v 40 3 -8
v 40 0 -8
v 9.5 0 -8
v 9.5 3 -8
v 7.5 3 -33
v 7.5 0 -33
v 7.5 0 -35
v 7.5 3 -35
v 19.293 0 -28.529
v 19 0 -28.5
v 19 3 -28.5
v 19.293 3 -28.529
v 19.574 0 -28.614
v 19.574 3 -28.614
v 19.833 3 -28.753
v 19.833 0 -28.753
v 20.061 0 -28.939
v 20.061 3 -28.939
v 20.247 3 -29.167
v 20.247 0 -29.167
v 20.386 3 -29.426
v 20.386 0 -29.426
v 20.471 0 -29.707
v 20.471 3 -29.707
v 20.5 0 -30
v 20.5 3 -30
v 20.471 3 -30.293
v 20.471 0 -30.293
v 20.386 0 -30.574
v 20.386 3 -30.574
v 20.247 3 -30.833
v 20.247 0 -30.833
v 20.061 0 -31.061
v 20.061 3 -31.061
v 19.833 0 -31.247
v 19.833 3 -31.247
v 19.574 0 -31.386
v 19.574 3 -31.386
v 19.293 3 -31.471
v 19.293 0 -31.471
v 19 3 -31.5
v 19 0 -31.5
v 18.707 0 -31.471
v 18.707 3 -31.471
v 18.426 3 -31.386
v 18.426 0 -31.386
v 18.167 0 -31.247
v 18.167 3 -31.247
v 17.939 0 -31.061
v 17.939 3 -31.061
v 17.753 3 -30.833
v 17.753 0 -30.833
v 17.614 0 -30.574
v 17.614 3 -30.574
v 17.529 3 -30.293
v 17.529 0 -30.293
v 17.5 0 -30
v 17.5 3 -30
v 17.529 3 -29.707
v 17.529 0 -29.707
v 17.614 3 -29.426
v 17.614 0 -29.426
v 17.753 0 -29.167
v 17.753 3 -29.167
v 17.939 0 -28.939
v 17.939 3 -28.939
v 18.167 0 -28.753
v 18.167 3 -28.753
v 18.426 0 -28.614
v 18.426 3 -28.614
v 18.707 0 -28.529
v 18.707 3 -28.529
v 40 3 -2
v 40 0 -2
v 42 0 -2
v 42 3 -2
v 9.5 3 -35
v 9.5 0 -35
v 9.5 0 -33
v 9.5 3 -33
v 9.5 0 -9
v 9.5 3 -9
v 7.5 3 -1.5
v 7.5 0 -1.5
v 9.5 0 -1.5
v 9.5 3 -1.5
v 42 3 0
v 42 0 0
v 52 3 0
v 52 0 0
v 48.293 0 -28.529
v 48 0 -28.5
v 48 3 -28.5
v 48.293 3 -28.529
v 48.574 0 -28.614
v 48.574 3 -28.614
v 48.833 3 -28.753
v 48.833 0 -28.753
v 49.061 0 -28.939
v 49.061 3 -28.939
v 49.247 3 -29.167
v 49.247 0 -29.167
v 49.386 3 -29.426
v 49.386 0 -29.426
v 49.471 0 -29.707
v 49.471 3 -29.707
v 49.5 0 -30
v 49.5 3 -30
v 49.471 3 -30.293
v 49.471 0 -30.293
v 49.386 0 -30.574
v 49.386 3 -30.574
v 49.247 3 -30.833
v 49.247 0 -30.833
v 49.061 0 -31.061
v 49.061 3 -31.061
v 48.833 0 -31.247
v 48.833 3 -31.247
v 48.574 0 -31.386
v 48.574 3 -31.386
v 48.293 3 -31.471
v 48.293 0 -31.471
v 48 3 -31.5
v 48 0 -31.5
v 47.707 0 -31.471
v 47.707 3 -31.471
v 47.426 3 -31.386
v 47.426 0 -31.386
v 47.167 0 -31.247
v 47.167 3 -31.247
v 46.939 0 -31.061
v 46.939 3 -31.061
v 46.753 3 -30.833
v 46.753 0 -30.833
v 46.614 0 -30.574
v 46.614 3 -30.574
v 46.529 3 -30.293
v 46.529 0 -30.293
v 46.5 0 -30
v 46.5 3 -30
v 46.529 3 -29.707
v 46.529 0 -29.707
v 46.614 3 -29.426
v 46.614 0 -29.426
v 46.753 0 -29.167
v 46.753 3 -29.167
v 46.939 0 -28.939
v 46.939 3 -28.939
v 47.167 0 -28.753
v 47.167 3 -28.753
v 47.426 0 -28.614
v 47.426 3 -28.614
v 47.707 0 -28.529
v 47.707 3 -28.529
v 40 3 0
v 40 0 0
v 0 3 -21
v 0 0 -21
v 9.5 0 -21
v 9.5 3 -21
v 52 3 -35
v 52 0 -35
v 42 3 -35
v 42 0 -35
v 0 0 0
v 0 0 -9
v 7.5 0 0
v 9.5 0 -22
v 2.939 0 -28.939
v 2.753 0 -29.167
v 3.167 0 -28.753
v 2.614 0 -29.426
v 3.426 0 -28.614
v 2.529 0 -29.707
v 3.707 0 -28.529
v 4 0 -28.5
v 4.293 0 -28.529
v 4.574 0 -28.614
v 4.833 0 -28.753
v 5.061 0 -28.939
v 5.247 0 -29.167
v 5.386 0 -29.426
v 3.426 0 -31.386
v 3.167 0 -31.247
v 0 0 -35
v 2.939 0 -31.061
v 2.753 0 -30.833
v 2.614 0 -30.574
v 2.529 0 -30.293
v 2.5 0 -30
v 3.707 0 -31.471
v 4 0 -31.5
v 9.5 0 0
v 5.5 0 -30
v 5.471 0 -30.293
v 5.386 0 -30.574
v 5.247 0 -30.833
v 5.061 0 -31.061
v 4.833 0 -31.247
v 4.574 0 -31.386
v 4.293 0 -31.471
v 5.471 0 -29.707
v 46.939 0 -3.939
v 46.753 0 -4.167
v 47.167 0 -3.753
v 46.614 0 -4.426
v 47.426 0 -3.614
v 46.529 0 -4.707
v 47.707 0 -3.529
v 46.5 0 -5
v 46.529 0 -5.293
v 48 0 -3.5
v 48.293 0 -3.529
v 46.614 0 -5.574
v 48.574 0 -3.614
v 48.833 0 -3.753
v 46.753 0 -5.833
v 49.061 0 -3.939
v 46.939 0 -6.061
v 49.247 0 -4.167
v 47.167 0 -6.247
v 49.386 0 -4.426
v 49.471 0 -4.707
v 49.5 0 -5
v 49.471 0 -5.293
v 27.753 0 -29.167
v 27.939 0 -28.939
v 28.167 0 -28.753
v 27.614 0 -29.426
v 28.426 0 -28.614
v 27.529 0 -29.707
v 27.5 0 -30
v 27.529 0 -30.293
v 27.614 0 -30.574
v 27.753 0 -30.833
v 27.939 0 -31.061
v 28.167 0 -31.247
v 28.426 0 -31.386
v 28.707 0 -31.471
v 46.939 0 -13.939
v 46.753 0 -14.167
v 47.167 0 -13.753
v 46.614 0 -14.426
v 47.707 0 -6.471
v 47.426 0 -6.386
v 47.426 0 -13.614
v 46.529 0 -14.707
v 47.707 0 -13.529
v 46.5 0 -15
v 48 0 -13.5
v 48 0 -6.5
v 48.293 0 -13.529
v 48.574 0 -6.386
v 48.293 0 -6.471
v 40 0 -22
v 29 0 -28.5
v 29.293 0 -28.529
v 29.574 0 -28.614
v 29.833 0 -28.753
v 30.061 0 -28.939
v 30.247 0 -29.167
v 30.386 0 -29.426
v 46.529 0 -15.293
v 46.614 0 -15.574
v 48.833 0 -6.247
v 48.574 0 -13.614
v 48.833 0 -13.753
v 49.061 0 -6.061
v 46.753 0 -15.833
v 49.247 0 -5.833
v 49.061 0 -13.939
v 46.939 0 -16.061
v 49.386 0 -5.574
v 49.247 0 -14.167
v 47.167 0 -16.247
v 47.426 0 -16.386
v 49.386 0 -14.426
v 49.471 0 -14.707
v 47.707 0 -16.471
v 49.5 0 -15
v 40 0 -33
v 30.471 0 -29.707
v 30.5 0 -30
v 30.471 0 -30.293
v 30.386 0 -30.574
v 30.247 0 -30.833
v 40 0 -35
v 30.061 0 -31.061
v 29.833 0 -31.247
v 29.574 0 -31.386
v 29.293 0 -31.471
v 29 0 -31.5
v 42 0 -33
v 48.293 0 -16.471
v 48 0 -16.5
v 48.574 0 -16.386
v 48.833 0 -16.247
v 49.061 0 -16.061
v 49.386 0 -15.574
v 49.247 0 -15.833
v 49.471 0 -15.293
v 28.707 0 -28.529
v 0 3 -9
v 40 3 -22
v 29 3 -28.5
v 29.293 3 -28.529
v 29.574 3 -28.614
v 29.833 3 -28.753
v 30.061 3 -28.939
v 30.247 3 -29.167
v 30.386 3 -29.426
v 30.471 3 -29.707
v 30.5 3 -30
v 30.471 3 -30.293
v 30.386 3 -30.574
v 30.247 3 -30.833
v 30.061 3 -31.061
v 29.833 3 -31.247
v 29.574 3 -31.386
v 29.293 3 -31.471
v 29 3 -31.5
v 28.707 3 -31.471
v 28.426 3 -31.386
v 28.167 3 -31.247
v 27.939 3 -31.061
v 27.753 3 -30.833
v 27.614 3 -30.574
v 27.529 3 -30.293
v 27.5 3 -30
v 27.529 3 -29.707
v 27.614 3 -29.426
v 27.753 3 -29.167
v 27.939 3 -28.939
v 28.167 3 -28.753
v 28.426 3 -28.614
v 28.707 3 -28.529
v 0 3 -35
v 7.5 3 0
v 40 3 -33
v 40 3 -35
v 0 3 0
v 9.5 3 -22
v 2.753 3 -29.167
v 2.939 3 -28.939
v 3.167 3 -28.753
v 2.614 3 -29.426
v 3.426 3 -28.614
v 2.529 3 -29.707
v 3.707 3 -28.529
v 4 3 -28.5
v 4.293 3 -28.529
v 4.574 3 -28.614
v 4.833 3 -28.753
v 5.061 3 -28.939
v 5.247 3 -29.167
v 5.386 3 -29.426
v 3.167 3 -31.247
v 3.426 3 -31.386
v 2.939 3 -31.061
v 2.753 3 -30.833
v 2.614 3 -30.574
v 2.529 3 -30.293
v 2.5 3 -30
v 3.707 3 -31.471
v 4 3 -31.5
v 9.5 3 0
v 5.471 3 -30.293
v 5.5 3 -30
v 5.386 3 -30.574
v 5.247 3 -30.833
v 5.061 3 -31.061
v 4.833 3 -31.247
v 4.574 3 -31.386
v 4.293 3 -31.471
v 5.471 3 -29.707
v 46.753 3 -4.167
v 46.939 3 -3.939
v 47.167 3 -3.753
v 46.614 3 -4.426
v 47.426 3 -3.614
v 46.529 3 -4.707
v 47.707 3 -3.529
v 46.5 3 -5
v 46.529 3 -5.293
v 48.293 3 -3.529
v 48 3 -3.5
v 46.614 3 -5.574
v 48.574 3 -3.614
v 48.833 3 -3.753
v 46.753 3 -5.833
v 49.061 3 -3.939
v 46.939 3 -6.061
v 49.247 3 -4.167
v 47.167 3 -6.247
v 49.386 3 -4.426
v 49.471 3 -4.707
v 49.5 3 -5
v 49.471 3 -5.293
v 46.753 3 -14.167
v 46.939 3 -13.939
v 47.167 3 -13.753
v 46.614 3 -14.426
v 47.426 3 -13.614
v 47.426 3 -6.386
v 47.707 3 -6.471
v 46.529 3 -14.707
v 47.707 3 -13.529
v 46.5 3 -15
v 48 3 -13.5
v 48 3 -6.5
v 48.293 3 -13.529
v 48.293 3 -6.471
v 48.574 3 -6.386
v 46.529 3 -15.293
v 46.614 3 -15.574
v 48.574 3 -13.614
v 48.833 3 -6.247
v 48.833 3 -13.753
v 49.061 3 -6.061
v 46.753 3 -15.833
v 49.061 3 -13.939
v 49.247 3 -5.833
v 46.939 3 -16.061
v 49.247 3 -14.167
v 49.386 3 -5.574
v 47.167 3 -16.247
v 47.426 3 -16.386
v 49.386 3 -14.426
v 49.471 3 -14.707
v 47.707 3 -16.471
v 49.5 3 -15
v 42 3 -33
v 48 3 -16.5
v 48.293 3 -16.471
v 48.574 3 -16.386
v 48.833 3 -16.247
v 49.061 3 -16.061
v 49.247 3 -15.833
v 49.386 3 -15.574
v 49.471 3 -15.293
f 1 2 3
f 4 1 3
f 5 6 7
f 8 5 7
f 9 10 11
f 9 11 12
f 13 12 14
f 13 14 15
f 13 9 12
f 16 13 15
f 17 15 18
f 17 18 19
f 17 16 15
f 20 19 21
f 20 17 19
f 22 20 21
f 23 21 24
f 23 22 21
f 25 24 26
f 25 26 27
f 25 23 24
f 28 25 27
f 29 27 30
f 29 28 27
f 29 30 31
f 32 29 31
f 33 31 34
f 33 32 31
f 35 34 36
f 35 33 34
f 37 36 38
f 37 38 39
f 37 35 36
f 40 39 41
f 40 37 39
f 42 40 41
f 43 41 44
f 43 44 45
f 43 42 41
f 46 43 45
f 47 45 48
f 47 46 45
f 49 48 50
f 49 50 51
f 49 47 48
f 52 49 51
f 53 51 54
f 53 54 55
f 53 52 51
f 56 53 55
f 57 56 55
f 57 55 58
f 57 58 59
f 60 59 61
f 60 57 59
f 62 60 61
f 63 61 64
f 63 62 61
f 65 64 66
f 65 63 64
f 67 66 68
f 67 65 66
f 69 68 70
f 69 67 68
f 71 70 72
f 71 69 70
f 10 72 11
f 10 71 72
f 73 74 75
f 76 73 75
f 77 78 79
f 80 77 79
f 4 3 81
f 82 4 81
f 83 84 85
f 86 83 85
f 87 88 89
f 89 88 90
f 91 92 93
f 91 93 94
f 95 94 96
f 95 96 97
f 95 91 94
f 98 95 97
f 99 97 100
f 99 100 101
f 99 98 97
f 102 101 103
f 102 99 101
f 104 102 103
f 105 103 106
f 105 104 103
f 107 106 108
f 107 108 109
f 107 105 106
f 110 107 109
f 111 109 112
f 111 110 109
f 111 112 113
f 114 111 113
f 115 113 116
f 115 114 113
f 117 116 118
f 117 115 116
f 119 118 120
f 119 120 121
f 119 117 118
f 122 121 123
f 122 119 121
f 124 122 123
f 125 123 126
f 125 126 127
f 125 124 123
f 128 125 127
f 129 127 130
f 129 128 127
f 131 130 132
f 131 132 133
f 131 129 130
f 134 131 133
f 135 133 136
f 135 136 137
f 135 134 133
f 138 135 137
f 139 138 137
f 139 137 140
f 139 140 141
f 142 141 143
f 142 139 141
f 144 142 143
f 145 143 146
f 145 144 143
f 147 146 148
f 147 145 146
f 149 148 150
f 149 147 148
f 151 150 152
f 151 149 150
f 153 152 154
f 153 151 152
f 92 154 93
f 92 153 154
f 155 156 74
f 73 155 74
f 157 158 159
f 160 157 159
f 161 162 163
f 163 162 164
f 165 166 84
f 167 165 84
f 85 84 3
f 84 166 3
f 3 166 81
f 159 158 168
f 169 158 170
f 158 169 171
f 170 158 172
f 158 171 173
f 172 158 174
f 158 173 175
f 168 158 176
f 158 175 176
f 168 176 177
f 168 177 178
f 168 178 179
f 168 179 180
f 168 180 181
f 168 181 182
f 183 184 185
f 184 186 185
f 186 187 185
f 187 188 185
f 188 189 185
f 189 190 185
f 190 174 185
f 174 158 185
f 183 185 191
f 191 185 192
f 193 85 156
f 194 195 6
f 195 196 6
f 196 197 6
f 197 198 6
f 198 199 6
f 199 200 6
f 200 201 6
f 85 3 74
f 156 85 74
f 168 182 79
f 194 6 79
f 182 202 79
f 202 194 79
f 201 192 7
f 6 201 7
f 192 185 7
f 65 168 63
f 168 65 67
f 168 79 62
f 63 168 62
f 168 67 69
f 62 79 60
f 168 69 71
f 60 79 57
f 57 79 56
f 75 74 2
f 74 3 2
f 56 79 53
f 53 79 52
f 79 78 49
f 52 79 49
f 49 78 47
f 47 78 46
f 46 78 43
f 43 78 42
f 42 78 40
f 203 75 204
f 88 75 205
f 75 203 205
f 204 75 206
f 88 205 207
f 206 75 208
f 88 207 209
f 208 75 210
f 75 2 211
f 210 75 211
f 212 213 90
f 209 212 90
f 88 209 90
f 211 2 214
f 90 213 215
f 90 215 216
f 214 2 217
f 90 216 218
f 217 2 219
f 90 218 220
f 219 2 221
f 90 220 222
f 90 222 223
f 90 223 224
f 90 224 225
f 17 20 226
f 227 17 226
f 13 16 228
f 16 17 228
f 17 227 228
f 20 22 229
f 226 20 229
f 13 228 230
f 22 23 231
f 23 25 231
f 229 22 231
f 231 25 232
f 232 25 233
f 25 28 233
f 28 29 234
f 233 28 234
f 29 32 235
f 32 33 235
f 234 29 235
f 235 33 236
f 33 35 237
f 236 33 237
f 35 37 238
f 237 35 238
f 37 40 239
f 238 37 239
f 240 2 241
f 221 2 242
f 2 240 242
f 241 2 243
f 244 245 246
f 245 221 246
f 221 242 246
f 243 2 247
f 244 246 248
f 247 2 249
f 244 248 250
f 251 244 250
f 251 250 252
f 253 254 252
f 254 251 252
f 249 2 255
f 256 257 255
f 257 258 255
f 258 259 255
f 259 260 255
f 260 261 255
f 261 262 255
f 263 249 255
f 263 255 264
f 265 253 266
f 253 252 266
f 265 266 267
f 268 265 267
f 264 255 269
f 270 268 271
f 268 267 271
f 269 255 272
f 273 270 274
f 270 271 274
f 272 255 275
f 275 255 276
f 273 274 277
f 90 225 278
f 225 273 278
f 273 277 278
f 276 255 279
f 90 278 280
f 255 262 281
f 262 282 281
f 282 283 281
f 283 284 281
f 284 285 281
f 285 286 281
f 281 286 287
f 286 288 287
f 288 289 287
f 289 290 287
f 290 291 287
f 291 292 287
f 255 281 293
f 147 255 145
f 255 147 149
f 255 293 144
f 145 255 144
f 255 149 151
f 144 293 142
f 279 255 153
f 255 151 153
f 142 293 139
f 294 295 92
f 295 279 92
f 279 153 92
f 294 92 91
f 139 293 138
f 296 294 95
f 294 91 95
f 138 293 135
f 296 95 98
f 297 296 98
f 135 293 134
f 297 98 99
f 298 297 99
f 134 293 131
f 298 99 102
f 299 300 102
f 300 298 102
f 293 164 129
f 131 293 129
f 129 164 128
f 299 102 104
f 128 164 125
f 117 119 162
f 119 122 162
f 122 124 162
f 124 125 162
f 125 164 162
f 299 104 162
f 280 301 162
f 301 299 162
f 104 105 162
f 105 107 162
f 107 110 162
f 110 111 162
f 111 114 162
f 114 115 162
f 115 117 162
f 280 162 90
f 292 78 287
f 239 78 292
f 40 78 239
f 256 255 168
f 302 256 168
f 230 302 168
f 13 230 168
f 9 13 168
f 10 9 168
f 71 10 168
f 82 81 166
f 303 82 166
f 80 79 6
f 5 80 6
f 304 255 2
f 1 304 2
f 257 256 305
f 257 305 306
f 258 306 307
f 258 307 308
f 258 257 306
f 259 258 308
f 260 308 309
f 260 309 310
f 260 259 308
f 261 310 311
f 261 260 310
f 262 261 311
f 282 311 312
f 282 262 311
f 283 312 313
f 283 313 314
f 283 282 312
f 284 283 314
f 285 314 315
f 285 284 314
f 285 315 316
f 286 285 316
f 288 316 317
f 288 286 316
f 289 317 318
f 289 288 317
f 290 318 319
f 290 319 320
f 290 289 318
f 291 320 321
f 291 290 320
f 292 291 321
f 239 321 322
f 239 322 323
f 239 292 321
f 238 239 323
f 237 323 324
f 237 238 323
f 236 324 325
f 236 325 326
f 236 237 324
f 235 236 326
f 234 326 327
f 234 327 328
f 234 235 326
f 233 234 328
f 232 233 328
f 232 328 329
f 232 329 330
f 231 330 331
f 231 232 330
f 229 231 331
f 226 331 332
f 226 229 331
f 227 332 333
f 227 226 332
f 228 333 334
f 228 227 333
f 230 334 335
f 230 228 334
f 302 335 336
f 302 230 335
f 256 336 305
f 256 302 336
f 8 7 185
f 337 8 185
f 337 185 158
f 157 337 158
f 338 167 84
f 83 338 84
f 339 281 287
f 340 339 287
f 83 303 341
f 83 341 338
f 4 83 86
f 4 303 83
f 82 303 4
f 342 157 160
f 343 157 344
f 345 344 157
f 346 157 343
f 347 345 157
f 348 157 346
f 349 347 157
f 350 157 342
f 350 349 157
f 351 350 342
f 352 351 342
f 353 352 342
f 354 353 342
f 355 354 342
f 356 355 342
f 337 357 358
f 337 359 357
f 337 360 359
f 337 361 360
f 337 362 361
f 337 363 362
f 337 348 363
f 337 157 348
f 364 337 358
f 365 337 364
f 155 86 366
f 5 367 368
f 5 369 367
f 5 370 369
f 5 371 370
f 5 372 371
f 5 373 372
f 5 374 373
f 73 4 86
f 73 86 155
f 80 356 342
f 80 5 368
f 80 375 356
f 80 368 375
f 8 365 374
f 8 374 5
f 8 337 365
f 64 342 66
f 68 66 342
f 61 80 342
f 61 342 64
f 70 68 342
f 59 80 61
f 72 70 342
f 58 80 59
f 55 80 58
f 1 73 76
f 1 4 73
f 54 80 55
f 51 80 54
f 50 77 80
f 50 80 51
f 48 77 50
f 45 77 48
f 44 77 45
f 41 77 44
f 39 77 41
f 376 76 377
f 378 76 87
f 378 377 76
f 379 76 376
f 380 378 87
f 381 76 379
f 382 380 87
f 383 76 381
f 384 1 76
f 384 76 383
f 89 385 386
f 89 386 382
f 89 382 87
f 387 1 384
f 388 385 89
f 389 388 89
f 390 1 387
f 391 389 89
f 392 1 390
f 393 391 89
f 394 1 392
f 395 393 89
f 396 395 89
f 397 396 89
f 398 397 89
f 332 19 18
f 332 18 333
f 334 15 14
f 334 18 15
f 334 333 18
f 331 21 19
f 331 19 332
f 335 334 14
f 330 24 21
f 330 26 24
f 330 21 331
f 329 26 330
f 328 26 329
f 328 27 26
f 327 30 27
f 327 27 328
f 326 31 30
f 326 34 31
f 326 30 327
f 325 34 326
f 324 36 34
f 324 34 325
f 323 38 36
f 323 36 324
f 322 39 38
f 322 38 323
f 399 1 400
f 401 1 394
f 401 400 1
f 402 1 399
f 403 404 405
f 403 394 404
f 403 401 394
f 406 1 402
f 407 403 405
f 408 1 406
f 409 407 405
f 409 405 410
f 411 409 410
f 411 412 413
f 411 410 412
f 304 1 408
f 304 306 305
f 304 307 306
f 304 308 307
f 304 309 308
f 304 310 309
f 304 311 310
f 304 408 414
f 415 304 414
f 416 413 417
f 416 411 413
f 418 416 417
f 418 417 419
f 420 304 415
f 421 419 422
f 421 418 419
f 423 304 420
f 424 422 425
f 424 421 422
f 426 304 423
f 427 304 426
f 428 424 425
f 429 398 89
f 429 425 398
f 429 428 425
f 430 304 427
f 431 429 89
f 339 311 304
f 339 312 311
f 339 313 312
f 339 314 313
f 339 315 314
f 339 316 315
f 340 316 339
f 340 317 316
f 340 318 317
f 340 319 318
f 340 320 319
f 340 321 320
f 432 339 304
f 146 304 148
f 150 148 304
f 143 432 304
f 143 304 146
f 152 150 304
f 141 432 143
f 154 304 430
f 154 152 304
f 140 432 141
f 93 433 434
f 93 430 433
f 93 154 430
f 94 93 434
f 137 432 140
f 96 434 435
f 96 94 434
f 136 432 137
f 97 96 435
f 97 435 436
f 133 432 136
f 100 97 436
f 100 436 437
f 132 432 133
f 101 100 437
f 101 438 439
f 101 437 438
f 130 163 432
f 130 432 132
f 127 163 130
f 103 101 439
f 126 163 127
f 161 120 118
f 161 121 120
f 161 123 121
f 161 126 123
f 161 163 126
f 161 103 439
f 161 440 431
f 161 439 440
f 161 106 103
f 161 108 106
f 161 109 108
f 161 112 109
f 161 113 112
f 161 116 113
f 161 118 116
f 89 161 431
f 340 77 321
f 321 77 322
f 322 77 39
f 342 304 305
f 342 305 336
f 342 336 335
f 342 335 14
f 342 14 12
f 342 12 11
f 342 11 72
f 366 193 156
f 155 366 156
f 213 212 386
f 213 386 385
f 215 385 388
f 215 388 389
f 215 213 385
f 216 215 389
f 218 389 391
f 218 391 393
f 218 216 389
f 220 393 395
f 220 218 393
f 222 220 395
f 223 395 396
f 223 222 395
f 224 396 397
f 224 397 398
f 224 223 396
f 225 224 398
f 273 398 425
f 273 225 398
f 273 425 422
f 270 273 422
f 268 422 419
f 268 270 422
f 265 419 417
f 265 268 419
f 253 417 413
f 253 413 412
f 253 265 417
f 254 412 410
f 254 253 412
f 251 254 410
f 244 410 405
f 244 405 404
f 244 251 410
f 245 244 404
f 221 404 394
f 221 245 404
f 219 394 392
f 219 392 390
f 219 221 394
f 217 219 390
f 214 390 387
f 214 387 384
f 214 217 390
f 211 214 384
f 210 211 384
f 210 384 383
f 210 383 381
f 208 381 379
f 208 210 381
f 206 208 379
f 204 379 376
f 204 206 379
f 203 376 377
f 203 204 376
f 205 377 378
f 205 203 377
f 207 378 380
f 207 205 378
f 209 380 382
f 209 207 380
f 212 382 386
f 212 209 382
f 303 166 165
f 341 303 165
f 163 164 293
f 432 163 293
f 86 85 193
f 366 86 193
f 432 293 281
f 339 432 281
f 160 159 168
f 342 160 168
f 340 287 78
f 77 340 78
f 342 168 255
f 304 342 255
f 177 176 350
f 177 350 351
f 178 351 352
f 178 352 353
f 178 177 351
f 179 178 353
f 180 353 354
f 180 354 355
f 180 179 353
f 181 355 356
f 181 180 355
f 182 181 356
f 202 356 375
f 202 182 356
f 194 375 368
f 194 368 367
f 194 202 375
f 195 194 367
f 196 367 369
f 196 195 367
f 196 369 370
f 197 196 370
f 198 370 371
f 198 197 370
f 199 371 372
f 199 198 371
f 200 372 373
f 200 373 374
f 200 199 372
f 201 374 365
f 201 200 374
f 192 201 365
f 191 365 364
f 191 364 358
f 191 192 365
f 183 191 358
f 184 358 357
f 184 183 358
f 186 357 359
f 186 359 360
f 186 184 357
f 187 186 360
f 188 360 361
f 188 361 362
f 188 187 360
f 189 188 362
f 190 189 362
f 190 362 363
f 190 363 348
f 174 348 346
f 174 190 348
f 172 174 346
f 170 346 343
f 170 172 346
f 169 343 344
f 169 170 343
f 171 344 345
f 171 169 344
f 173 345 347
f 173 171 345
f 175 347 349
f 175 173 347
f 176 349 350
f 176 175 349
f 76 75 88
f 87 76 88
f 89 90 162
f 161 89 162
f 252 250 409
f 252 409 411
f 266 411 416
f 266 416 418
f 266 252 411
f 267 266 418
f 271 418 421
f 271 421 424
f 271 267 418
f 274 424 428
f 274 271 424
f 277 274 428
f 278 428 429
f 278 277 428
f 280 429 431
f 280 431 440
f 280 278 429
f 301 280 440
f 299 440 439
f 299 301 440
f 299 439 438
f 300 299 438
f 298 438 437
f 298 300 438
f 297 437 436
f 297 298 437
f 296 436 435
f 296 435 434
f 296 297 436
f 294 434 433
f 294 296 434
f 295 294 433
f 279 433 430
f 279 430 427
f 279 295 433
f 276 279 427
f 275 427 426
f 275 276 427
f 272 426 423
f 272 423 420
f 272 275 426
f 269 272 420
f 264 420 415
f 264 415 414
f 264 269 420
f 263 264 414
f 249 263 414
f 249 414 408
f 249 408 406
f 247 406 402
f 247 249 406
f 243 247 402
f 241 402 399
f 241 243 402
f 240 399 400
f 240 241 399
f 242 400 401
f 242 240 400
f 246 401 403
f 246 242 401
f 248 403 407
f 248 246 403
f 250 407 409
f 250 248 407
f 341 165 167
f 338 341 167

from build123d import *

# Parameters (mm, degrees)
SKETCH1_R           = 1.5
BOSS_EXTRUDE1_DEPTH = 3


with BuildPart() as part:
    # Sketch1 → Boss-Extrude1 (new body)
    with BuildSketch(Plane(origin=(0, 0, 0), x_dir=(1, 0, 0), z_dir=(0, 1, 0))):
        Polygon((0, 9), (0, 0), (7.5, 0), (7.5, 1.5), (9.5, 1.5), (9.5, 0), (40, 0), (40, 2), (42, 2), (42, 0), (52, 0), (52, 35), (42, 35), (42, 33), (40, 33), (40, 35), (9.5, 35), (9.5, 33), (7.5, 33), (7.5, 35), (0, 35), (0, 21), (9.5, 21), (9.5, 22), (40, 22), (40, 8), (9.5, 8), (9.5, 9), align=None)
        with Locations((48, 5)):
            Circle(SKETCH1_R, mode=Mode.SUBTRACT)
        with Locations((48, 15)):
            Circle(SKETCH1_R, mode=Mode.SUBTRACT)
        with Locations((4, 30)):
            Circle(SKETCH1_R, mode=Mode.SUBTRACT)
        with Locations((19, 30)):
            Circle(SKETCH1_R, mode=Mode.SUBTRACT)
        with Locations((29, 30)):
            Circle(SKETCH1_R, mode=Mode.SUBTRACT)
        with Locations((48, 30)):
            Circle(SKETCH1_R, mode=Mode.SUBTRACT)
    extrude(amount=BOSS_EXTRUDE1_DEPTH)


solid = part.part
